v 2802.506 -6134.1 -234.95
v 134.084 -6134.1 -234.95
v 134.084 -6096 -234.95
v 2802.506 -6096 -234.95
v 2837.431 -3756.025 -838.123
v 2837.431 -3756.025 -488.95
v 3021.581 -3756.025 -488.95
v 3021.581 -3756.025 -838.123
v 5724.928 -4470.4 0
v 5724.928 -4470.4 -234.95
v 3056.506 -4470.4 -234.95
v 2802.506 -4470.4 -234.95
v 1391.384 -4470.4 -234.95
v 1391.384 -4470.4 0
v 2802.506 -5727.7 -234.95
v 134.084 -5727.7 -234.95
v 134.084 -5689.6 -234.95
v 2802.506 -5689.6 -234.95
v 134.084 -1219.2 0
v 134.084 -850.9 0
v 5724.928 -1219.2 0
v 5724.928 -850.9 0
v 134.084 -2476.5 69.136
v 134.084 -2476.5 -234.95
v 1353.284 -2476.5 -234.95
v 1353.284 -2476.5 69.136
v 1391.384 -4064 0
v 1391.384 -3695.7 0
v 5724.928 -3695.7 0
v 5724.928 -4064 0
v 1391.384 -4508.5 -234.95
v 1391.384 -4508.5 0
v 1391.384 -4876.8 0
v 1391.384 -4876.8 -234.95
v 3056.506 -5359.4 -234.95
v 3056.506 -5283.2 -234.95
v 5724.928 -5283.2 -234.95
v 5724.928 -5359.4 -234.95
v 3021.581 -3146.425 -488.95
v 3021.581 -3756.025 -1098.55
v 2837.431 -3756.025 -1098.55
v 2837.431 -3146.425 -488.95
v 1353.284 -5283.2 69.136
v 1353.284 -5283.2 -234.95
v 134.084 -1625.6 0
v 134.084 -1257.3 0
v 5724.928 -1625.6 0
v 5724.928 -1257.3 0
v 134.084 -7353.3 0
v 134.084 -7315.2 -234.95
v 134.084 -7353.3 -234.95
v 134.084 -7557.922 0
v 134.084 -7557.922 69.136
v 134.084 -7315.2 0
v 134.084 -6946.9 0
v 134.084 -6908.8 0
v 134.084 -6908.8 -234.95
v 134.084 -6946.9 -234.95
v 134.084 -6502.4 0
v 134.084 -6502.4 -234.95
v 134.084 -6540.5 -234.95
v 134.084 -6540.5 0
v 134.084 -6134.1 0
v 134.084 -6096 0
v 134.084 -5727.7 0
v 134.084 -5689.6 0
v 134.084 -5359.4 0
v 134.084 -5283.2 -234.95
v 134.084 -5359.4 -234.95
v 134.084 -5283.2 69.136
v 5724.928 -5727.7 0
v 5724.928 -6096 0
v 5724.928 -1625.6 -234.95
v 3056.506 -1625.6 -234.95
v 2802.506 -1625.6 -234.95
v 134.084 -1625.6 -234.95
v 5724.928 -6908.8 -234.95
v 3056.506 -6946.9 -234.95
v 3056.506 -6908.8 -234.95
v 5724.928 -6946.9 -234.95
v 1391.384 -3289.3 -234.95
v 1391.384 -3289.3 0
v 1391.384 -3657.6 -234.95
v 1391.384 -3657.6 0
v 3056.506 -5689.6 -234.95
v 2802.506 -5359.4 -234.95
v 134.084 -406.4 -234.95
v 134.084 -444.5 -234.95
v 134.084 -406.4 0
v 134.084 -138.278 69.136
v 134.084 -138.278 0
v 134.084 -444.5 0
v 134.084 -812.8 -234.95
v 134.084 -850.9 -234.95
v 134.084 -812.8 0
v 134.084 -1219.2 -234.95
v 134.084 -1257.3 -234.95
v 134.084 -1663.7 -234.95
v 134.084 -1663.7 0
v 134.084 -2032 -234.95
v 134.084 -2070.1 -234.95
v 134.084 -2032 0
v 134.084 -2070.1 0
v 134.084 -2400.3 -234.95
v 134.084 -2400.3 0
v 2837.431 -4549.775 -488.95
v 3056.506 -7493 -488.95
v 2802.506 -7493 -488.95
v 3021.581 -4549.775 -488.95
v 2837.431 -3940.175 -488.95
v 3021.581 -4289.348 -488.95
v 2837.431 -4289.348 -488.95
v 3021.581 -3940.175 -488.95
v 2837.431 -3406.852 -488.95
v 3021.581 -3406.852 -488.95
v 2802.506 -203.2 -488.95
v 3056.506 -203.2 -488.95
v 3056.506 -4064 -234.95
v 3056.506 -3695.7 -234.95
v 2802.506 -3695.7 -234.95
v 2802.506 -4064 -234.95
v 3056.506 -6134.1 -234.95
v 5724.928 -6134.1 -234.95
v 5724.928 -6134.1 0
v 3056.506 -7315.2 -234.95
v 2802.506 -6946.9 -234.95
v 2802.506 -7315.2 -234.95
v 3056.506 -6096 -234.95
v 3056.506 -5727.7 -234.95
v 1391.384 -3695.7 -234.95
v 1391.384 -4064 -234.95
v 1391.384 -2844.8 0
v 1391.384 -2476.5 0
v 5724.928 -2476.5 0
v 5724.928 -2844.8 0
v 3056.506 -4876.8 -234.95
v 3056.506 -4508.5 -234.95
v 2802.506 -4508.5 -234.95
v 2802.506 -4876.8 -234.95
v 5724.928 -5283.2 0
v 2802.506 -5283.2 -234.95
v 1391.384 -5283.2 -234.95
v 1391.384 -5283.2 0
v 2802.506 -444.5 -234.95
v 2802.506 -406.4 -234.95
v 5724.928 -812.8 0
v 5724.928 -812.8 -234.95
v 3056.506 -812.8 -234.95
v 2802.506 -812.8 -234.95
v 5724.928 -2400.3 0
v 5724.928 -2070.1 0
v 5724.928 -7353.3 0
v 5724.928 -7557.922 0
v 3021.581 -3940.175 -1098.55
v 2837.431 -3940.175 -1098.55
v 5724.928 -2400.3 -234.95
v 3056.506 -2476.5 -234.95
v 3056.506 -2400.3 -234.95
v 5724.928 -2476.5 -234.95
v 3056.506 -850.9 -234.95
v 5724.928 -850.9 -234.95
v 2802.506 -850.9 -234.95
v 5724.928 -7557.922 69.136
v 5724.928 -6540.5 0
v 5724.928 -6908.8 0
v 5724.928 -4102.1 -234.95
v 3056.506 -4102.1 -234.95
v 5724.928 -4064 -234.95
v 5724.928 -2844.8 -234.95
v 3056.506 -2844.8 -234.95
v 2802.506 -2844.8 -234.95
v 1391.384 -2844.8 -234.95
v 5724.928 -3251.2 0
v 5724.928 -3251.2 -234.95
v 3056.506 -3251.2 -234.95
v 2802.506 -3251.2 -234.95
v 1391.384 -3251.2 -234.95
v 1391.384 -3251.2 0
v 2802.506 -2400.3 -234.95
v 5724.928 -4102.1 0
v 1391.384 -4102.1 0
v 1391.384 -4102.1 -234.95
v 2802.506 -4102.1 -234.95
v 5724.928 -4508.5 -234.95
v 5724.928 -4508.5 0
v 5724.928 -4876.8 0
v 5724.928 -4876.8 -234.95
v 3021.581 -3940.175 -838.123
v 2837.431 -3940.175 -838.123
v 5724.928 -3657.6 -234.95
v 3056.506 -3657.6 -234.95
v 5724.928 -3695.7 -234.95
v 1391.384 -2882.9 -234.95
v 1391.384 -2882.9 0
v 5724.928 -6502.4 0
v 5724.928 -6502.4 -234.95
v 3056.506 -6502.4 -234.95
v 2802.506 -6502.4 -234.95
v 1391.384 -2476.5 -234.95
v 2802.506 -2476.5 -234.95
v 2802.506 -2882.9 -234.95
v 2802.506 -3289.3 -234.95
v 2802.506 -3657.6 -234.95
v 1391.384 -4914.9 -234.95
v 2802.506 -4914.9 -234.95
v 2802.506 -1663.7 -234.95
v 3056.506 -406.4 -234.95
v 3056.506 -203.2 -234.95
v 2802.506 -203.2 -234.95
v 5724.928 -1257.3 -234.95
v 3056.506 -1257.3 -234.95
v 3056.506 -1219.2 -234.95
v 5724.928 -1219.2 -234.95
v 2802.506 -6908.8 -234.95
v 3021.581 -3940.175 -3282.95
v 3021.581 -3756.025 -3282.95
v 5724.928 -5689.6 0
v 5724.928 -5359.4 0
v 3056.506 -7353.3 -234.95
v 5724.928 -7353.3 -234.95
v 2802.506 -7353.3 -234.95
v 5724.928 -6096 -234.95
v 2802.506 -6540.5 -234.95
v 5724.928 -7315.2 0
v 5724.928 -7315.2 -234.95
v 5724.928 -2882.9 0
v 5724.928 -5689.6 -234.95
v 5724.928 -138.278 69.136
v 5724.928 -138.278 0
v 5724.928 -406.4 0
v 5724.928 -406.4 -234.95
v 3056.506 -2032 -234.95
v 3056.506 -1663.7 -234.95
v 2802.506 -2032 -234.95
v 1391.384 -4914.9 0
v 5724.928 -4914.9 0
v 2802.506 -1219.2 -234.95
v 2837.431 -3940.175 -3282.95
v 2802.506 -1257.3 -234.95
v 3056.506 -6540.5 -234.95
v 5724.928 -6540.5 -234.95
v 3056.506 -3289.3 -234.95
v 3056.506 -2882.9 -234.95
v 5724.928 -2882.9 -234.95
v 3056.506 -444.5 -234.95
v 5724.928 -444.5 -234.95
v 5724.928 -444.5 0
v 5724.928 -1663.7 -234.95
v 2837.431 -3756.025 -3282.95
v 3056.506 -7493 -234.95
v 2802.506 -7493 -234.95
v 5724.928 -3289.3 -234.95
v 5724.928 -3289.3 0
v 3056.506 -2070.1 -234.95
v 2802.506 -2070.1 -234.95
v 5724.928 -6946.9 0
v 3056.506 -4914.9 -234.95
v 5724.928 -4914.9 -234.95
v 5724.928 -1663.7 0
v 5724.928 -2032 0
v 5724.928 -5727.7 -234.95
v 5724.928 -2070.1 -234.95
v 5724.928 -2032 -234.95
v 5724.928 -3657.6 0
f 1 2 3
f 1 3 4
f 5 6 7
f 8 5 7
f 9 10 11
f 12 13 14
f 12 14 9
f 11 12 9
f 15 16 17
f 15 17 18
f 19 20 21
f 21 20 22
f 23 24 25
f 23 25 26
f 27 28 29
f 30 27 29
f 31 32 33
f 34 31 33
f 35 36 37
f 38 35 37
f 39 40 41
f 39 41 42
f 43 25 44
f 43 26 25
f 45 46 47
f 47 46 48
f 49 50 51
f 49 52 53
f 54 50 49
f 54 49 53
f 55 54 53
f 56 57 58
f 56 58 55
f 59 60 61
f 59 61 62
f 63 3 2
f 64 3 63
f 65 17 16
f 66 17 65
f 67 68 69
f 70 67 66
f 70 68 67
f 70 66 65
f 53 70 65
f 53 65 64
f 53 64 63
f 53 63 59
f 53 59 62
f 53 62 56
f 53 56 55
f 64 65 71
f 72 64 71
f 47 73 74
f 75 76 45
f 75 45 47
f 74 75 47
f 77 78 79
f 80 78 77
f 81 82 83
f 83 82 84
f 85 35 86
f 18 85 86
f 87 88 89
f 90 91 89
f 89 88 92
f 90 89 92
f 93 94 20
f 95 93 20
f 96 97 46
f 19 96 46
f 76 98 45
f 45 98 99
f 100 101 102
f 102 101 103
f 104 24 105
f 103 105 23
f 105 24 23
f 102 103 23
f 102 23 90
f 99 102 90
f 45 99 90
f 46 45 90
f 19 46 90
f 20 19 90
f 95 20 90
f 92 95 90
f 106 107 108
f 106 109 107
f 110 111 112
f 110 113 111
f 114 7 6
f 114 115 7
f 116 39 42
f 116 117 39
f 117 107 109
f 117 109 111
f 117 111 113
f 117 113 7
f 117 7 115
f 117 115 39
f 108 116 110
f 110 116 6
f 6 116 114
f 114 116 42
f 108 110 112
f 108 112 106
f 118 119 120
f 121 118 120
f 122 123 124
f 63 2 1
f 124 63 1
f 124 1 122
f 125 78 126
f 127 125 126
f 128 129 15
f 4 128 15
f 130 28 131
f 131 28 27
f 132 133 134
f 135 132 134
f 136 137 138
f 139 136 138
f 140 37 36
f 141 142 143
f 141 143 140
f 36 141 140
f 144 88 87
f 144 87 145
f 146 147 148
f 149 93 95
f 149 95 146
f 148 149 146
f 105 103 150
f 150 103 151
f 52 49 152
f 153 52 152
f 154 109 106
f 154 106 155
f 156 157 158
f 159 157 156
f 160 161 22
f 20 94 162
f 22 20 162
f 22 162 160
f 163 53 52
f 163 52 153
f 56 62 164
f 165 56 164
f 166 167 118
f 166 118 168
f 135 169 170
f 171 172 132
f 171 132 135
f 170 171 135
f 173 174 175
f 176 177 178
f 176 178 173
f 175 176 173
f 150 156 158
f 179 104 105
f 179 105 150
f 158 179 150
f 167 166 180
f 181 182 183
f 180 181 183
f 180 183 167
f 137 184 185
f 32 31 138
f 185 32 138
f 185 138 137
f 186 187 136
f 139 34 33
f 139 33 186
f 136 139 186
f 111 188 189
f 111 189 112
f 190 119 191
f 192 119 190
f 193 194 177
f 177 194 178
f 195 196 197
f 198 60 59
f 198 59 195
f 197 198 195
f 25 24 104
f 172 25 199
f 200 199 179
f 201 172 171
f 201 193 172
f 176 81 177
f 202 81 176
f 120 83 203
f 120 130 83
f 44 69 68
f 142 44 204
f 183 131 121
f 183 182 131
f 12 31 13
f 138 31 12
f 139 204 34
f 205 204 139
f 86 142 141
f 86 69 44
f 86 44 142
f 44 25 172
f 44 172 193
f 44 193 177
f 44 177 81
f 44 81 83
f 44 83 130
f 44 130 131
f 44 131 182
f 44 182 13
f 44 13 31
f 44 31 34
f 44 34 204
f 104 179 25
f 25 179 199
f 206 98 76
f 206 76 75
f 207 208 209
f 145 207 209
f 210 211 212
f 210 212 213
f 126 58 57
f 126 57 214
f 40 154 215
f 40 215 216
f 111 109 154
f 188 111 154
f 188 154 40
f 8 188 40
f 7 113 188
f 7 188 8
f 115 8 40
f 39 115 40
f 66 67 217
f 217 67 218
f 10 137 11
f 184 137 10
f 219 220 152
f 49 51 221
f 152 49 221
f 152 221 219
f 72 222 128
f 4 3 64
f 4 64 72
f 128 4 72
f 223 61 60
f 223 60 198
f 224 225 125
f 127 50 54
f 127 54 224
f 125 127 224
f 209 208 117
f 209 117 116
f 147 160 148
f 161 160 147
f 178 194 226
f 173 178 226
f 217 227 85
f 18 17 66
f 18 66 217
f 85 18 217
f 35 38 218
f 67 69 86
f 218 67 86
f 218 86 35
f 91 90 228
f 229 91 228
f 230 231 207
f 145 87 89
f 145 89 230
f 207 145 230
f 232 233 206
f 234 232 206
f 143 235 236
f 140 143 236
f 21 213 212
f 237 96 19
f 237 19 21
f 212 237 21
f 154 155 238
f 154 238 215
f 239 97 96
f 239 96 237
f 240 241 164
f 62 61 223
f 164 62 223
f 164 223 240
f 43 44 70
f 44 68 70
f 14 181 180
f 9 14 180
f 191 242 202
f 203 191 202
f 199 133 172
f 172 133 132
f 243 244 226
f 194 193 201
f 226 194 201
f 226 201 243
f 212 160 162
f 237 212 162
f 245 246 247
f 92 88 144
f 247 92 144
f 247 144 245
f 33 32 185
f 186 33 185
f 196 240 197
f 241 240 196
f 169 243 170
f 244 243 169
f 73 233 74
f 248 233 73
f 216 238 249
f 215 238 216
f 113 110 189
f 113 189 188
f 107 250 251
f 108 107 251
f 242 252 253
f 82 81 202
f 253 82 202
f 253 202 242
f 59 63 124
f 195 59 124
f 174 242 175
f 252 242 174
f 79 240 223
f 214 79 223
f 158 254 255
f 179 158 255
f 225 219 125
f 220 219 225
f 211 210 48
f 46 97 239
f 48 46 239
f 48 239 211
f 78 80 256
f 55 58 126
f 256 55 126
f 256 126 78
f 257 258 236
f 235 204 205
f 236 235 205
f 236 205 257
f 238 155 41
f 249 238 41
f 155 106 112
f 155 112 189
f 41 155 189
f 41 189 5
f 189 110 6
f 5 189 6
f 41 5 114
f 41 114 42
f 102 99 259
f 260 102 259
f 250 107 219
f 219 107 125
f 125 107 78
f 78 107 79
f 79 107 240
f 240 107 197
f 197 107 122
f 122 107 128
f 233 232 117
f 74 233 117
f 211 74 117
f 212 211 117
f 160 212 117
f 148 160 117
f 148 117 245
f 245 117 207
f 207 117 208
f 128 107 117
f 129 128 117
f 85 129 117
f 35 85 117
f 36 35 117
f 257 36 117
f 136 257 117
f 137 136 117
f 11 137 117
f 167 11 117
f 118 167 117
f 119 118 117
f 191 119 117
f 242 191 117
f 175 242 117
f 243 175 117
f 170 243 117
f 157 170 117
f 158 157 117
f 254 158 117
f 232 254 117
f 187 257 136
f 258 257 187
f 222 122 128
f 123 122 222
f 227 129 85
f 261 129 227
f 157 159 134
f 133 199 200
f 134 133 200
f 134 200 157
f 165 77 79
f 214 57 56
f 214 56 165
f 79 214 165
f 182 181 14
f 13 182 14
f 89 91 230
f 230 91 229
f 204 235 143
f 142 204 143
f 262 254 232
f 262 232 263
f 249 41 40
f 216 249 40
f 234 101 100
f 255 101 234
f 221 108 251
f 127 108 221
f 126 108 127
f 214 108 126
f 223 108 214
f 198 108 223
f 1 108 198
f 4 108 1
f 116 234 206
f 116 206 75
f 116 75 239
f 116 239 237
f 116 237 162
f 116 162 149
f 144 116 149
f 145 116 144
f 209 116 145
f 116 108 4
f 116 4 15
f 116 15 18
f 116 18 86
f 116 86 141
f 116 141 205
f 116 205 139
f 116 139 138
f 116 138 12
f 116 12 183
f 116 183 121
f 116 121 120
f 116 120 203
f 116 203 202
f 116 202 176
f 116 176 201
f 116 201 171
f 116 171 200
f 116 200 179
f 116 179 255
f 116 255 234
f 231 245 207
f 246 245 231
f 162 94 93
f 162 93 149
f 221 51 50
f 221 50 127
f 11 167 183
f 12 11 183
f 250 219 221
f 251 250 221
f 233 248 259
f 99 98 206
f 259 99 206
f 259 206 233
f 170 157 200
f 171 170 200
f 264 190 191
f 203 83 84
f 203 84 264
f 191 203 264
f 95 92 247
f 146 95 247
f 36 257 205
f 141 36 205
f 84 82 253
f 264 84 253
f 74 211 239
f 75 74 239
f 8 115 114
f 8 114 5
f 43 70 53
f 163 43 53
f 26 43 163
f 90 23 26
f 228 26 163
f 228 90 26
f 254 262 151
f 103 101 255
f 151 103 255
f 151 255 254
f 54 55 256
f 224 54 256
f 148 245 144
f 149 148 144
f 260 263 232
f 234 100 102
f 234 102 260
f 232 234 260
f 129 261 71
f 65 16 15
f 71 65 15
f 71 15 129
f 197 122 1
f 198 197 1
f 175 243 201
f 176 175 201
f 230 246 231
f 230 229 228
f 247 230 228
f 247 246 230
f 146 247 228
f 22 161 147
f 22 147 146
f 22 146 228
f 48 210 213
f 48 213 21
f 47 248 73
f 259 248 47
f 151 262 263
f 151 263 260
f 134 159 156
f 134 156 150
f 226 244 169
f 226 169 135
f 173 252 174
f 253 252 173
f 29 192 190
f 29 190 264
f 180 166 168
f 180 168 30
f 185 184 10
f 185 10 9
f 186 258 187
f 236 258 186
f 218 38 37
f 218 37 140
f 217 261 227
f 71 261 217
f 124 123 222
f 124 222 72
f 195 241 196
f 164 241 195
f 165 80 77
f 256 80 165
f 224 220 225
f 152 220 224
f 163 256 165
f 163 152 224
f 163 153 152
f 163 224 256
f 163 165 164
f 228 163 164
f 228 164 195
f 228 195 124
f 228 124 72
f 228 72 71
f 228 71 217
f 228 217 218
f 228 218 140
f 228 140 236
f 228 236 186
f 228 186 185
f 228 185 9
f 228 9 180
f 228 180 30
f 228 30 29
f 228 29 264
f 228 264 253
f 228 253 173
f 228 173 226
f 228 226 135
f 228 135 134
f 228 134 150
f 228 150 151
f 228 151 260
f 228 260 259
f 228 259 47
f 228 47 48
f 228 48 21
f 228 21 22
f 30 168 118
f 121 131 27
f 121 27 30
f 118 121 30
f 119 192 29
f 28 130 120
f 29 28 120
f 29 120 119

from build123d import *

# Parameters (mm, degrees)
F0_W      = 5867.4
F0_H      = 7696.2
F1_DEPTH  = 69.135625
F2_W      = 5867.4
F2_H      = 7696.2
F2_W_2    = 5791.2
F2_H_2    = 7620
F3_DEPTH  = 234.95
F4_W      = 38.1
F4_H      = 234.95
F5_DEPTH  = 5863.2060388453
F7_W      = 254
F7_H      = 254
F8_DEPTH  = 7289.8
F9_W      = 184.15
F9_H      = 184.15
F10_DEPTH = 2794
F12_DEPTH = 184.15
F13_W     = 5867.4
F13_H     = 7696.2
F13_W_2   = 5590.8448
F13_H_2   = 7419.6448
F14_DEPTH = 304.085625
F15_W     = 1219.2
F15_H     = 2806.7
F16_DEPTH = 304.8
F17_W     = 368.3
F17_H     = 234.95
F18_DEPTH = 38.1
F19_DEPTH = 38.1
F20_DEPTH = 38.1


with BuildPart() as f1:
    # F0 (on Top) → F1 (new body)
    with BuildSketch(Plane.XY):
        with Locations((2929.5060388453, -3848.1)):
            Rectangle(F0_W, F0_H)
    extrude(amount=F1_DEPTH)

    # F2 (on face) → F3 (join)
    with BuildSketch(Plane(origin=(0, 0, 0), x_dir=(1, 0, 0), z_dir=(0, 0, -1))):
        with Locations((2929.5060388453, 3848.1)):
            Rectangle(F2_W, F2_H)
        with Locations((2929.5060388453, 3848.1)):
            Rectangle(F2_W_2, F2_H_2, mode=Mode.SUBTRACT)
    extrude(amount=F3_DEPTH)

    # F4 (on Right) → F5 (join, through all)
    with BuildSketch(Plane.YZ):
        with Locations((-425.45, -117.475)):
            Rectangle(F4_W, F4_H)
        with Locations((-831.85, -117.475)):
            Rectangle(F4_W, F4_H)
        with Locations((-1238.25, -117.475)):
            Rectangle(F4_W, F4_H)
        with Locations((-1644.65, -117.475)):
            Rectangle(F4_W, F4_H)
        with Locations((-2051.05, -117.475)):
            Rectangle(F4_W, F4_H)
        with Locations((-2457.45, -117.475)):
            Rectangle(F4_W, F4_H)
        with Locations((-2863.85, -117.475)):
            Rectangle(F4_W, F4_H)
        with Locations((-3270.25, -117.475)):
            Rectangle(F4_W, F4_H)
        with Locations((-3676.65, -117.475)):
            Rectangle(F4_W, F4_H)
        with Locations((-4083.05, -117.475)):
            Rectangle(F4_W, F4_H)
        with Locations((-4489.45, -117.475)):
            Rectangle(F4_W, F4_H)
        with Locations((-4895.85, -117.475)):
            Rectangle(F4_W, F4_H)
        with Locations((-5302.25, -117.475)):
            Rectangle(F4_W, F4_H)
        with Locations((-5708.65, -117.475)):
            Rectangle(F4_W, F4_H)
        with Locations((-6115.05, -117.475)):
            Rectangle(F4_W, F4_H)
        with Locations((-6521.45, -117.475)):
            Rectangle(F4_W, F4_H)
        with Locations((-6927.85, -117.475)):
            Rectangle(F4_W, F4_H)
        with Locations((-7334.25, -117.475)):
            Rectangle(F4_W, F4_H)
    extrude(amount=F5_DEPTH)

    # F7 (on offset) → F8 (join)
    with BuildSketch(Plane(origin=(0, -203.2, 0), x_dir=(-1, 0, 0), z_dir=(0, 1, 0))):
        with Locations((-2929.5060388453, -361.95)):
            Rectangle(F7_W, F7_H)
    extrude(amount=-F8_DEPTH)

    # F9 (on face) → F10 (join)
    with BuildSketch(Plane(origin=(0, 0, -488.95), x_dir=(1, 0, 0), z_dir=(0, 0, -1))):
        with Locations((2929.5060388453, 3848.1)):
            Rectangle(F9_W, F9_H)
    extrude(amount=F10_DEPTH)

    # F11 (on face) → F12 (join, through all)
    with BuildSketch(Plane.YZ.offset(3021.5810388453)):
        Polygon((-3940.175, -838.122572489), (-4289.347572489, -488.95), (-4549.775, -488.95), (-3940.175, -1098.55), align=None)
        Polygon((-3406.852427511, -488.95), (-3756.025, -838.122572489), (-3756.025, -1098.55), (-3146.425, -488.95), align=None)
    extrude(amount=-F12_DEPTH)

    # F13 (on face) → F14 (cut, through all)
    with BuildSketch(Plane.XY.offset(69.135625)):
        with Locations((2929.5060388453, -3848.1)):
            Rectangle(F13_W, F13_H)
        with Locations((2929.5060388453, -3848.1)):
            Rectangle(F13_W_2, F13_H_2, mode=Mode.SUBTRACT)
    extrude(amount=-F14_DEPTH, mode=Mode.SUBTRACT)

    # F15 (on face) → F16 (cut)
    with BuildSketch(Plane.XY.offset(69.135625)):
        with Locations((743.6836388453, -3879.85)):
            Rectangle(F15_W, F15_H)
    extrude(amount=-F16_DEPTH, mode=Mode.SUBTRACT)

    # F17 (on face) → F18 (join)
    with BuildSketch(Plane(origin=(1353.2836388453, 0, 0), x_dir=(0, -1, 0), z_dir=(-1, 0, 0))):
        with Locations((2660.65, -117.475)):
            Rectangle(F17_W, F17_H)
        with Locations((3067.05, -117.475)):
            Rectangle(F17_W, F17_H)
        with Locations((3473.45, -117.475)):
            Rectangle(F17_W, F17_H)
        with Locations((3879.85, -117.475)):
            Rectangle(F17_W, F17_H)
        with Locations((4286.25, -117.475)):
            Rectangle(F17_W, F17_H)
        with Locations((4692.65, -117.475)):
            Rectangle(F17_W, F17_H)
        with Locations((5099.05, -117.475)):
            Rectangle(F17_W, F17_H)
    extrude(amount=-F18_DEPTH)

    # F19 (add): a face of the model
    f19_faces = [f1.faces().sort_by_distance(p)[0] for p in [
        (2929.5060388453, -5321.3, -117.475),
    ]]
    extrude(f19_faces, amount=F19_DEPTH)

    # F20 (add): a face of the model
    f20_faces = [f1.faces().sort_by_distance(p)[0] for p in [
        (2929.5060388453, -2438.4, -117.475),
    ]]
    extrude(f20_faces, amount=F20_DEPTH)


solid = f1.part
